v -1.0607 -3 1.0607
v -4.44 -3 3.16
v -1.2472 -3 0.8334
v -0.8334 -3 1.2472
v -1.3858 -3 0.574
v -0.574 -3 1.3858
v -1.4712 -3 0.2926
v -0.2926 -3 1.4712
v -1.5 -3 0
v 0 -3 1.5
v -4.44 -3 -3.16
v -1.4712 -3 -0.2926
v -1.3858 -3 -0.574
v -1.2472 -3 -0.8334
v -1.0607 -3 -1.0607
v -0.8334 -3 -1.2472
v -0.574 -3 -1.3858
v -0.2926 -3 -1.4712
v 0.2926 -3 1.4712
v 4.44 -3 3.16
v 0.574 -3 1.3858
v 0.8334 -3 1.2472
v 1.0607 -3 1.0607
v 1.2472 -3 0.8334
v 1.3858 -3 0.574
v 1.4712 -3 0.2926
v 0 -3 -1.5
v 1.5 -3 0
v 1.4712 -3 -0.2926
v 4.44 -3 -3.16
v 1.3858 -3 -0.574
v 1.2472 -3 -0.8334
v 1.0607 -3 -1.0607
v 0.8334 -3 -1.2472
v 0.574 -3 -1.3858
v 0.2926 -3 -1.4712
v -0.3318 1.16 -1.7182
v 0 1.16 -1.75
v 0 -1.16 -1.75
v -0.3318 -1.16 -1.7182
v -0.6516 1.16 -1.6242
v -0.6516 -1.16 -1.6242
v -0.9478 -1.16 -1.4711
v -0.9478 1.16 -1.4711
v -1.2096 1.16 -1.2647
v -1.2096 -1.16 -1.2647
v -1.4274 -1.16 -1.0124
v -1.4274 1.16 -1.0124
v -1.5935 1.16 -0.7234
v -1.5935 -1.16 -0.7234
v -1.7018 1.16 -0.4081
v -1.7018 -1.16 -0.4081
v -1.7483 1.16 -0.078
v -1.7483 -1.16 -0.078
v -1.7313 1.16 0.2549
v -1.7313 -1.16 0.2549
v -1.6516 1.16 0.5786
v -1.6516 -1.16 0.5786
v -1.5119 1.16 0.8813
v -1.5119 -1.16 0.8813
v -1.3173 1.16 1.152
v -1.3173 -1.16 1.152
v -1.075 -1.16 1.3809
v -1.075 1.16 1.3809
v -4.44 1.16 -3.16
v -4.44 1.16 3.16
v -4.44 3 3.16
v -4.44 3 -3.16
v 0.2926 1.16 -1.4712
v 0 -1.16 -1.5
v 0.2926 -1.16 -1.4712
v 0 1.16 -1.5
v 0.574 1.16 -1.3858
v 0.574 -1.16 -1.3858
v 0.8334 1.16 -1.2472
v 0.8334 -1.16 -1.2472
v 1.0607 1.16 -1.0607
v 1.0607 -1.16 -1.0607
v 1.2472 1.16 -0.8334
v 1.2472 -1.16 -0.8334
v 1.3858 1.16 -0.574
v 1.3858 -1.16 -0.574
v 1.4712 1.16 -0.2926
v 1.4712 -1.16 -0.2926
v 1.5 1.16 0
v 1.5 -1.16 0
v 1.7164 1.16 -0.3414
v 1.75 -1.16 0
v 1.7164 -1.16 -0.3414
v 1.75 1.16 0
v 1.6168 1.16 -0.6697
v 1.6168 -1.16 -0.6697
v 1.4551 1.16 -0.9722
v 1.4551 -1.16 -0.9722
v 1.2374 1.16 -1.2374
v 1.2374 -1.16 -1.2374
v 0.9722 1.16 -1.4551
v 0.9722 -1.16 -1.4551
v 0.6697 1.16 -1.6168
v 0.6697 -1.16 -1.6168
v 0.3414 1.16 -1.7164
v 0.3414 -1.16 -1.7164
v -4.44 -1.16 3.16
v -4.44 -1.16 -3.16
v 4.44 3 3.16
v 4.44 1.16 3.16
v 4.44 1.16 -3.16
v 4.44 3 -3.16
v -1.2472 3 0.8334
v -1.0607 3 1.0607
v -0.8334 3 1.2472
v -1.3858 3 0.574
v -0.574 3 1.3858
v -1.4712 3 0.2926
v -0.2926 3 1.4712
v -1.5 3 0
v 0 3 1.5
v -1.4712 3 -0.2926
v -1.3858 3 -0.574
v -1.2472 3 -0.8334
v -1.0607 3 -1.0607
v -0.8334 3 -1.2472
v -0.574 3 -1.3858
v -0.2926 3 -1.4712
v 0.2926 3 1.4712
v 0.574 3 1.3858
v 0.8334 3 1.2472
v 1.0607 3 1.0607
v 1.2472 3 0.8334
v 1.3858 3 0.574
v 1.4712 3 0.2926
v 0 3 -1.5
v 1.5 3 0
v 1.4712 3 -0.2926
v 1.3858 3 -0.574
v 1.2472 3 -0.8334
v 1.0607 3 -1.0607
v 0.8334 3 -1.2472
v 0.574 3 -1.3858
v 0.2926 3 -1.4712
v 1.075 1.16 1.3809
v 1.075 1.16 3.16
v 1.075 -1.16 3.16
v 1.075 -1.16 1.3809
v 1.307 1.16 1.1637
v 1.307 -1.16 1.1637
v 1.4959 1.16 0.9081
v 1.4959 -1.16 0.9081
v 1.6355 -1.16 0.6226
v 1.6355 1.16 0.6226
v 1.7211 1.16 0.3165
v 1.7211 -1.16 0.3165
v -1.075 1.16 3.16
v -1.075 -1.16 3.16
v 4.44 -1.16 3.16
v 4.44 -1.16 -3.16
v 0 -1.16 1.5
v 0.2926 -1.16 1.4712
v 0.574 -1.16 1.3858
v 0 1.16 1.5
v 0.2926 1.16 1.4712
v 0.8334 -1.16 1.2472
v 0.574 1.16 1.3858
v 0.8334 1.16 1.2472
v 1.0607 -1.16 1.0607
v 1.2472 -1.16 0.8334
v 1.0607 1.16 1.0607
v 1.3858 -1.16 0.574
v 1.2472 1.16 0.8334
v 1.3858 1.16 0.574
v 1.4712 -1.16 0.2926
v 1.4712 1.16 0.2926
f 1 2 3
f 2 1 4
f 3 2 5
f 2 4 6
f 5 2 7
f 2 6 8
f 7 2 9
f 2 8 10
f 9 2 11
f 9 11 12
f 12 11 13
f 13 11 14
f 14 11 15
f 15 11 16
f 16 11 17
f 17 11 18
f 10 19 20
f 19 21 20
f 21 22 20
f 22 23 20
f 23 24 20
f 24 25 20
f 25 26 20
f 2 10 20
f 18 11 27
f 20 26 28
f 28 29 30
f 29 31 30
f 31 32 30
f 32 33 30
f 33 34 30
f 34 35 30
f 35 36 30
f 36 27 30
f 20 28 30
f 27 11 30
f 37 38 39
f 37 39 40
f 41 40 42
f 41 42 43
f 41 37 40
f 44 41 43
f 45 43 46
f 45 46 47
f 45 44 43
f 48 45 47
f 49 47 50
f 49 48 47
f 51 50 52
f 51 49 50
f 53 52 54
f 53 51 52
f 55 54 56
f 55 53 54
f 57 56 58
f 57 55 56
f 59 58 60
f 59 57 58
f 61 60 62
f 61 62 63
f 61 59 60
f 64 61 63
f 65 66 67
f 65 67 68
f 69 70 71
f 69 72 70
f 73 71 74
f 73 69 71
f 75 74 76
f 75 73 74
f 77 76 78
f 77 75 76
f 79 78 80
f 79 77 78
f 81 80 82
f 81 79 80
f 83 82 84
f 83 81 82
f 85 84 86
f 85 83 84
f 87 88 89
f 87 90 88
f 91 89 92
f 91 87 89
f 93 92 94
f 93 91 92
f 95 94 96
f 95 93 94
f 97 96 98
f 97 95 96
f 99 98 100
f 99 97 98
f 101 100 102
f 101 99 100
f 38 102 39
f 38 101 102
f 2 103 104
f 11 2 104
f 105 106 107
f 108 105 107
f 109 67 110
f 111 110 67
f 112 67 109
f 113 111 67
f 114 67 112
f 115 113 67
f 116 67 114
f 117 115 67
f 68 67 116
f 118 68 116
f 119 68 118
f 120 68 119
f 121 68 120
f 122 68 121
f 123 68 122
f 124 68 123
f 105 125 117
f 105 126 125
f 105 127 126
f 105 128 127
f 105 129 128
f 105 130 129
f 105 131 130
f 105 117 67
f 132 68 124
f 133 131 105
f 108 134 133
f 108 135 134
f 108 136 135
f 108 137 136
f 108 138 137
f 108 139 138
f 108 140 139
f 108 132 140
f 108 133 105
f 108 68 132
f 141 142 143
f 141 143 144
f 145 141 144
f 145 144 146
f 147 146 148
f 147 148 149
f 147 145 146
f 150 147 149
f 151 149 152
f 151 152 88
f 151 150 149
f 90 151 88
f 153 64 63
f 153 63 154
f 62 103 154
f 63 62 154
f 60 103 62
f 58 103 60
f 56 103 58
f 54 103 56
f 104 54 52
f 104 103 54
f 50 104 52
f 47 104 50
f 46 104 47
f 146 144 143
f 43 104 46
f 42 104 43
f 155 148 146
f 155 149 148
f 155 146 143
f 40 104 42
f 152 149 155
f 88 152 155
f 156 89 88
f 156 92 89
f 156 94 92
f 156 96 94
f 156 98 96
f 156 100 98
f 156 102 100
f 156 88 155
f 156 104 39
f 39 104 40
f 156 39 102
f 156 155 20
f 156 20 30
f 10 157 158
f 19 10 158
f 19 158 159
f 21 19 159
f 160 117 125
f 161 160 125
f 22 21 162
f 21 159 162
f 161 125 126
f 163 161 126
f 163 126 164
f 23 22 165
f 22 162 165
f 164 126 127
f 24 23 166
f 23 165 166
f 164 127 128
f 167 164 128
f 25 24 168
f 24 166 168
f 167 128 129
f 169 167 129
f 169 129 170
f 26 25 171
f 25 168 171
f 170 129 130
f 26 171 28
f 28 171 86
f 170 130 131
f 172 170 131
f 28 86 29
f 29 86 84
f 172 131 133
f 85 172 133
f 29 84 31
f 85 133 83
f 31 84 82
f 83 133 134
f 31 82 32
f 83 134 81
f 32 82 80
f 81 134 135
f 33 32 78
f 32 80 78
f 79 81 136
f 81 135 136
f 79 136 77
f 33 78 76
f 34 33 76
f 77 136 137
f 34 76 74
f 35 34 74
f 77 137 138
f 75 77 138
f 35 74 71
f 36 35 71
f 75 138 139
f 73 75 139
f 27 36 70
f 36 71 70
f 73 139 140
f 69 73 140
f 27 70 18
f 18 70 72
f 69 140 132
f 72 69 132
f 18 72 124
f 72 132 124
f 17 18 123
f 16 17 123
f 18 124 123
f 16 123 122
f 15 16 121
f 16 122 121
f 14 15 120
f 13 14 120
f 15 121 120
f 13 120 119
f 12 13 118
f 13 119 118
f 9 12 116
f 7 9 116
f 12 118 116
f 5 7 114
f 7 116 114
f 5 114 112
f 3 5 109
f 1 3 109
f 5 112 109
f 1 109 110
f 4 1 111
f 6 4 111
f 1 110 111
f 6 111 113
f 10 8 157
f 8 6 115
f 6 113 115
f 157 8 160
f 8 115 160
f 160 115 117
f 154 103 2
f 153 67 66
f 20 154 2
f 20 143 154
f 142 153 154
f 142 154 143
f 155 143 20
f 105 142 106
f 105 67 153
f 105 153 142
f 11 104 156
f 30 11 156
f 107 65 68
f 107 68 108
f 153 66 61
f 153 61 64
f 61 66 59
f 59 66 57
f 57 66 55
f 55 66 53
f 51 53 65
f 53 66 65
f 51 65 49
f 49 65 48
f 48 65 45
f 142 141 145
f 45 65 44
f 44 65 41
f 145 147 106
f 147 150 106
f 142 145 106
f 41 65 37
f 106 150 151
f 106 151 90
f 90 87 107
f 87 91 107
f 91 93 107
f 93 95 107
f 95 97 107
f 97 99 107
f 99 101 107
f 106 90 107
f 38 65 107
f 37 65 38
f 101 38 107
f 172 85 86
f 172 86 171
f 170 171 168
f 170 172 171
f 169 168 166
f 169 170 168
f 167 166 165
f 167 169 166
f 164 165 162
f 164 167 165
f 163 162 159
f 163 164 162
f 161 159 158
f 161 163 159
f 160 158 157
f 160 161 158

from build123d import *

# Parameters (mm, degrees)
BOSS_EXTRUDE1_DEPTH = 1.16
SKETCH2_W           = 8.88
SKETCH2_H           = 6.32
SKETCH2_R           = 1.5
BOSS_EXTRUDE2_DEPTH = 1.84


with BuildPart() as part:
    # Sketch1 → Boss-Extrude1 (new body)
    with BuildSketch(Plane(origin=(0, 0, 0), x_dir=(1, 0, 0), z_dir=(0, 1, 0))):
        with BuildLine():
            ThreePointArc((0, -1.75), (-0.568301, -1.655154), (-1.075, -1.380896))
            Line((-1.075, -1.380896), (-1.075, -3.16))
            Line((-1.075, -3.16), (0, -3.16))
            Line((0, -3.16), (0, -1.75))
        make_face()
        with BuildLine():
            ThreePointArc((1.075, -1.380896), (0.568301, -1.655154), (0, -1.75))
            Line((0, -1.75), (0, -3.16))
            Line((0, -3.16), (1.075, -3.16))
            Line((1.075, -3.16), (1.075, -1.380896))
        make_face()
        with BuildLine():
            ThreePointArc((0, 1.75), (-1.655154, 0.568301), (-1.075, -1.380896))
            ThreePointArc((-1.075, -1.380896), (-0.568301, -1.655154), (0, -1.75))
            Line((0, -1.75), (0, -1.5))
            ThreePointArc((0, -1.5), (-1.5, 0), (0, 1.5))
            Line((0, 1.5), (0, 1.75))
        make_face()
        with BuildLine():
            ThreePointArc((1.75, 0), (1.237437, 1.237437), (0, 1.75))
            Line((0, 1.75), (0, 1.5))
            ThreePointArc((0, 1.5), (1.06066, 1.06066), (1.5, 0))
            ThreePointArc((1.5, 0), (1.06066, -1.06066), (0, -1.5))
            Line((0, -1.5), (0, -1.75))
            ThreePointArc((0, -1.75), (0.568301, -1.655154), (1.075, -1.380896))
            ThreePointArc((1.075, -1.380896), (1.57222, -0.768521), (1.75, 0))
        make_face()
    boss_extrude1 = extrude(amount=BOSS_EXTRUDE1_DEPTH)

    # Sketch2 → Boss-Extrude2 (add)
    with BuildSketch(Plane(origin=(0, 1.16, 0), x_dir=(1, 0, 0), z_dir=(0, 1, 0))):
        Rectangle(SKETCH2_W, SKETCH2_H)
        with Locations(Location((0, 0, 0), (0, 0, 270))):
            Circle(SKETCH2_R, mode=Mode.SUBTRACT)
    boss_extrude2 = extrude(amount=BOSS_EXTRUDE2_DEPTH)

    # Mirror1: Boss-Extrude1, Boss-Extrude2 across plane
    add(boss_extrude1.mirror(Plane.ZX))
    add(boss_extrude2.mirror(Plane.ZX))


solid = part.part
